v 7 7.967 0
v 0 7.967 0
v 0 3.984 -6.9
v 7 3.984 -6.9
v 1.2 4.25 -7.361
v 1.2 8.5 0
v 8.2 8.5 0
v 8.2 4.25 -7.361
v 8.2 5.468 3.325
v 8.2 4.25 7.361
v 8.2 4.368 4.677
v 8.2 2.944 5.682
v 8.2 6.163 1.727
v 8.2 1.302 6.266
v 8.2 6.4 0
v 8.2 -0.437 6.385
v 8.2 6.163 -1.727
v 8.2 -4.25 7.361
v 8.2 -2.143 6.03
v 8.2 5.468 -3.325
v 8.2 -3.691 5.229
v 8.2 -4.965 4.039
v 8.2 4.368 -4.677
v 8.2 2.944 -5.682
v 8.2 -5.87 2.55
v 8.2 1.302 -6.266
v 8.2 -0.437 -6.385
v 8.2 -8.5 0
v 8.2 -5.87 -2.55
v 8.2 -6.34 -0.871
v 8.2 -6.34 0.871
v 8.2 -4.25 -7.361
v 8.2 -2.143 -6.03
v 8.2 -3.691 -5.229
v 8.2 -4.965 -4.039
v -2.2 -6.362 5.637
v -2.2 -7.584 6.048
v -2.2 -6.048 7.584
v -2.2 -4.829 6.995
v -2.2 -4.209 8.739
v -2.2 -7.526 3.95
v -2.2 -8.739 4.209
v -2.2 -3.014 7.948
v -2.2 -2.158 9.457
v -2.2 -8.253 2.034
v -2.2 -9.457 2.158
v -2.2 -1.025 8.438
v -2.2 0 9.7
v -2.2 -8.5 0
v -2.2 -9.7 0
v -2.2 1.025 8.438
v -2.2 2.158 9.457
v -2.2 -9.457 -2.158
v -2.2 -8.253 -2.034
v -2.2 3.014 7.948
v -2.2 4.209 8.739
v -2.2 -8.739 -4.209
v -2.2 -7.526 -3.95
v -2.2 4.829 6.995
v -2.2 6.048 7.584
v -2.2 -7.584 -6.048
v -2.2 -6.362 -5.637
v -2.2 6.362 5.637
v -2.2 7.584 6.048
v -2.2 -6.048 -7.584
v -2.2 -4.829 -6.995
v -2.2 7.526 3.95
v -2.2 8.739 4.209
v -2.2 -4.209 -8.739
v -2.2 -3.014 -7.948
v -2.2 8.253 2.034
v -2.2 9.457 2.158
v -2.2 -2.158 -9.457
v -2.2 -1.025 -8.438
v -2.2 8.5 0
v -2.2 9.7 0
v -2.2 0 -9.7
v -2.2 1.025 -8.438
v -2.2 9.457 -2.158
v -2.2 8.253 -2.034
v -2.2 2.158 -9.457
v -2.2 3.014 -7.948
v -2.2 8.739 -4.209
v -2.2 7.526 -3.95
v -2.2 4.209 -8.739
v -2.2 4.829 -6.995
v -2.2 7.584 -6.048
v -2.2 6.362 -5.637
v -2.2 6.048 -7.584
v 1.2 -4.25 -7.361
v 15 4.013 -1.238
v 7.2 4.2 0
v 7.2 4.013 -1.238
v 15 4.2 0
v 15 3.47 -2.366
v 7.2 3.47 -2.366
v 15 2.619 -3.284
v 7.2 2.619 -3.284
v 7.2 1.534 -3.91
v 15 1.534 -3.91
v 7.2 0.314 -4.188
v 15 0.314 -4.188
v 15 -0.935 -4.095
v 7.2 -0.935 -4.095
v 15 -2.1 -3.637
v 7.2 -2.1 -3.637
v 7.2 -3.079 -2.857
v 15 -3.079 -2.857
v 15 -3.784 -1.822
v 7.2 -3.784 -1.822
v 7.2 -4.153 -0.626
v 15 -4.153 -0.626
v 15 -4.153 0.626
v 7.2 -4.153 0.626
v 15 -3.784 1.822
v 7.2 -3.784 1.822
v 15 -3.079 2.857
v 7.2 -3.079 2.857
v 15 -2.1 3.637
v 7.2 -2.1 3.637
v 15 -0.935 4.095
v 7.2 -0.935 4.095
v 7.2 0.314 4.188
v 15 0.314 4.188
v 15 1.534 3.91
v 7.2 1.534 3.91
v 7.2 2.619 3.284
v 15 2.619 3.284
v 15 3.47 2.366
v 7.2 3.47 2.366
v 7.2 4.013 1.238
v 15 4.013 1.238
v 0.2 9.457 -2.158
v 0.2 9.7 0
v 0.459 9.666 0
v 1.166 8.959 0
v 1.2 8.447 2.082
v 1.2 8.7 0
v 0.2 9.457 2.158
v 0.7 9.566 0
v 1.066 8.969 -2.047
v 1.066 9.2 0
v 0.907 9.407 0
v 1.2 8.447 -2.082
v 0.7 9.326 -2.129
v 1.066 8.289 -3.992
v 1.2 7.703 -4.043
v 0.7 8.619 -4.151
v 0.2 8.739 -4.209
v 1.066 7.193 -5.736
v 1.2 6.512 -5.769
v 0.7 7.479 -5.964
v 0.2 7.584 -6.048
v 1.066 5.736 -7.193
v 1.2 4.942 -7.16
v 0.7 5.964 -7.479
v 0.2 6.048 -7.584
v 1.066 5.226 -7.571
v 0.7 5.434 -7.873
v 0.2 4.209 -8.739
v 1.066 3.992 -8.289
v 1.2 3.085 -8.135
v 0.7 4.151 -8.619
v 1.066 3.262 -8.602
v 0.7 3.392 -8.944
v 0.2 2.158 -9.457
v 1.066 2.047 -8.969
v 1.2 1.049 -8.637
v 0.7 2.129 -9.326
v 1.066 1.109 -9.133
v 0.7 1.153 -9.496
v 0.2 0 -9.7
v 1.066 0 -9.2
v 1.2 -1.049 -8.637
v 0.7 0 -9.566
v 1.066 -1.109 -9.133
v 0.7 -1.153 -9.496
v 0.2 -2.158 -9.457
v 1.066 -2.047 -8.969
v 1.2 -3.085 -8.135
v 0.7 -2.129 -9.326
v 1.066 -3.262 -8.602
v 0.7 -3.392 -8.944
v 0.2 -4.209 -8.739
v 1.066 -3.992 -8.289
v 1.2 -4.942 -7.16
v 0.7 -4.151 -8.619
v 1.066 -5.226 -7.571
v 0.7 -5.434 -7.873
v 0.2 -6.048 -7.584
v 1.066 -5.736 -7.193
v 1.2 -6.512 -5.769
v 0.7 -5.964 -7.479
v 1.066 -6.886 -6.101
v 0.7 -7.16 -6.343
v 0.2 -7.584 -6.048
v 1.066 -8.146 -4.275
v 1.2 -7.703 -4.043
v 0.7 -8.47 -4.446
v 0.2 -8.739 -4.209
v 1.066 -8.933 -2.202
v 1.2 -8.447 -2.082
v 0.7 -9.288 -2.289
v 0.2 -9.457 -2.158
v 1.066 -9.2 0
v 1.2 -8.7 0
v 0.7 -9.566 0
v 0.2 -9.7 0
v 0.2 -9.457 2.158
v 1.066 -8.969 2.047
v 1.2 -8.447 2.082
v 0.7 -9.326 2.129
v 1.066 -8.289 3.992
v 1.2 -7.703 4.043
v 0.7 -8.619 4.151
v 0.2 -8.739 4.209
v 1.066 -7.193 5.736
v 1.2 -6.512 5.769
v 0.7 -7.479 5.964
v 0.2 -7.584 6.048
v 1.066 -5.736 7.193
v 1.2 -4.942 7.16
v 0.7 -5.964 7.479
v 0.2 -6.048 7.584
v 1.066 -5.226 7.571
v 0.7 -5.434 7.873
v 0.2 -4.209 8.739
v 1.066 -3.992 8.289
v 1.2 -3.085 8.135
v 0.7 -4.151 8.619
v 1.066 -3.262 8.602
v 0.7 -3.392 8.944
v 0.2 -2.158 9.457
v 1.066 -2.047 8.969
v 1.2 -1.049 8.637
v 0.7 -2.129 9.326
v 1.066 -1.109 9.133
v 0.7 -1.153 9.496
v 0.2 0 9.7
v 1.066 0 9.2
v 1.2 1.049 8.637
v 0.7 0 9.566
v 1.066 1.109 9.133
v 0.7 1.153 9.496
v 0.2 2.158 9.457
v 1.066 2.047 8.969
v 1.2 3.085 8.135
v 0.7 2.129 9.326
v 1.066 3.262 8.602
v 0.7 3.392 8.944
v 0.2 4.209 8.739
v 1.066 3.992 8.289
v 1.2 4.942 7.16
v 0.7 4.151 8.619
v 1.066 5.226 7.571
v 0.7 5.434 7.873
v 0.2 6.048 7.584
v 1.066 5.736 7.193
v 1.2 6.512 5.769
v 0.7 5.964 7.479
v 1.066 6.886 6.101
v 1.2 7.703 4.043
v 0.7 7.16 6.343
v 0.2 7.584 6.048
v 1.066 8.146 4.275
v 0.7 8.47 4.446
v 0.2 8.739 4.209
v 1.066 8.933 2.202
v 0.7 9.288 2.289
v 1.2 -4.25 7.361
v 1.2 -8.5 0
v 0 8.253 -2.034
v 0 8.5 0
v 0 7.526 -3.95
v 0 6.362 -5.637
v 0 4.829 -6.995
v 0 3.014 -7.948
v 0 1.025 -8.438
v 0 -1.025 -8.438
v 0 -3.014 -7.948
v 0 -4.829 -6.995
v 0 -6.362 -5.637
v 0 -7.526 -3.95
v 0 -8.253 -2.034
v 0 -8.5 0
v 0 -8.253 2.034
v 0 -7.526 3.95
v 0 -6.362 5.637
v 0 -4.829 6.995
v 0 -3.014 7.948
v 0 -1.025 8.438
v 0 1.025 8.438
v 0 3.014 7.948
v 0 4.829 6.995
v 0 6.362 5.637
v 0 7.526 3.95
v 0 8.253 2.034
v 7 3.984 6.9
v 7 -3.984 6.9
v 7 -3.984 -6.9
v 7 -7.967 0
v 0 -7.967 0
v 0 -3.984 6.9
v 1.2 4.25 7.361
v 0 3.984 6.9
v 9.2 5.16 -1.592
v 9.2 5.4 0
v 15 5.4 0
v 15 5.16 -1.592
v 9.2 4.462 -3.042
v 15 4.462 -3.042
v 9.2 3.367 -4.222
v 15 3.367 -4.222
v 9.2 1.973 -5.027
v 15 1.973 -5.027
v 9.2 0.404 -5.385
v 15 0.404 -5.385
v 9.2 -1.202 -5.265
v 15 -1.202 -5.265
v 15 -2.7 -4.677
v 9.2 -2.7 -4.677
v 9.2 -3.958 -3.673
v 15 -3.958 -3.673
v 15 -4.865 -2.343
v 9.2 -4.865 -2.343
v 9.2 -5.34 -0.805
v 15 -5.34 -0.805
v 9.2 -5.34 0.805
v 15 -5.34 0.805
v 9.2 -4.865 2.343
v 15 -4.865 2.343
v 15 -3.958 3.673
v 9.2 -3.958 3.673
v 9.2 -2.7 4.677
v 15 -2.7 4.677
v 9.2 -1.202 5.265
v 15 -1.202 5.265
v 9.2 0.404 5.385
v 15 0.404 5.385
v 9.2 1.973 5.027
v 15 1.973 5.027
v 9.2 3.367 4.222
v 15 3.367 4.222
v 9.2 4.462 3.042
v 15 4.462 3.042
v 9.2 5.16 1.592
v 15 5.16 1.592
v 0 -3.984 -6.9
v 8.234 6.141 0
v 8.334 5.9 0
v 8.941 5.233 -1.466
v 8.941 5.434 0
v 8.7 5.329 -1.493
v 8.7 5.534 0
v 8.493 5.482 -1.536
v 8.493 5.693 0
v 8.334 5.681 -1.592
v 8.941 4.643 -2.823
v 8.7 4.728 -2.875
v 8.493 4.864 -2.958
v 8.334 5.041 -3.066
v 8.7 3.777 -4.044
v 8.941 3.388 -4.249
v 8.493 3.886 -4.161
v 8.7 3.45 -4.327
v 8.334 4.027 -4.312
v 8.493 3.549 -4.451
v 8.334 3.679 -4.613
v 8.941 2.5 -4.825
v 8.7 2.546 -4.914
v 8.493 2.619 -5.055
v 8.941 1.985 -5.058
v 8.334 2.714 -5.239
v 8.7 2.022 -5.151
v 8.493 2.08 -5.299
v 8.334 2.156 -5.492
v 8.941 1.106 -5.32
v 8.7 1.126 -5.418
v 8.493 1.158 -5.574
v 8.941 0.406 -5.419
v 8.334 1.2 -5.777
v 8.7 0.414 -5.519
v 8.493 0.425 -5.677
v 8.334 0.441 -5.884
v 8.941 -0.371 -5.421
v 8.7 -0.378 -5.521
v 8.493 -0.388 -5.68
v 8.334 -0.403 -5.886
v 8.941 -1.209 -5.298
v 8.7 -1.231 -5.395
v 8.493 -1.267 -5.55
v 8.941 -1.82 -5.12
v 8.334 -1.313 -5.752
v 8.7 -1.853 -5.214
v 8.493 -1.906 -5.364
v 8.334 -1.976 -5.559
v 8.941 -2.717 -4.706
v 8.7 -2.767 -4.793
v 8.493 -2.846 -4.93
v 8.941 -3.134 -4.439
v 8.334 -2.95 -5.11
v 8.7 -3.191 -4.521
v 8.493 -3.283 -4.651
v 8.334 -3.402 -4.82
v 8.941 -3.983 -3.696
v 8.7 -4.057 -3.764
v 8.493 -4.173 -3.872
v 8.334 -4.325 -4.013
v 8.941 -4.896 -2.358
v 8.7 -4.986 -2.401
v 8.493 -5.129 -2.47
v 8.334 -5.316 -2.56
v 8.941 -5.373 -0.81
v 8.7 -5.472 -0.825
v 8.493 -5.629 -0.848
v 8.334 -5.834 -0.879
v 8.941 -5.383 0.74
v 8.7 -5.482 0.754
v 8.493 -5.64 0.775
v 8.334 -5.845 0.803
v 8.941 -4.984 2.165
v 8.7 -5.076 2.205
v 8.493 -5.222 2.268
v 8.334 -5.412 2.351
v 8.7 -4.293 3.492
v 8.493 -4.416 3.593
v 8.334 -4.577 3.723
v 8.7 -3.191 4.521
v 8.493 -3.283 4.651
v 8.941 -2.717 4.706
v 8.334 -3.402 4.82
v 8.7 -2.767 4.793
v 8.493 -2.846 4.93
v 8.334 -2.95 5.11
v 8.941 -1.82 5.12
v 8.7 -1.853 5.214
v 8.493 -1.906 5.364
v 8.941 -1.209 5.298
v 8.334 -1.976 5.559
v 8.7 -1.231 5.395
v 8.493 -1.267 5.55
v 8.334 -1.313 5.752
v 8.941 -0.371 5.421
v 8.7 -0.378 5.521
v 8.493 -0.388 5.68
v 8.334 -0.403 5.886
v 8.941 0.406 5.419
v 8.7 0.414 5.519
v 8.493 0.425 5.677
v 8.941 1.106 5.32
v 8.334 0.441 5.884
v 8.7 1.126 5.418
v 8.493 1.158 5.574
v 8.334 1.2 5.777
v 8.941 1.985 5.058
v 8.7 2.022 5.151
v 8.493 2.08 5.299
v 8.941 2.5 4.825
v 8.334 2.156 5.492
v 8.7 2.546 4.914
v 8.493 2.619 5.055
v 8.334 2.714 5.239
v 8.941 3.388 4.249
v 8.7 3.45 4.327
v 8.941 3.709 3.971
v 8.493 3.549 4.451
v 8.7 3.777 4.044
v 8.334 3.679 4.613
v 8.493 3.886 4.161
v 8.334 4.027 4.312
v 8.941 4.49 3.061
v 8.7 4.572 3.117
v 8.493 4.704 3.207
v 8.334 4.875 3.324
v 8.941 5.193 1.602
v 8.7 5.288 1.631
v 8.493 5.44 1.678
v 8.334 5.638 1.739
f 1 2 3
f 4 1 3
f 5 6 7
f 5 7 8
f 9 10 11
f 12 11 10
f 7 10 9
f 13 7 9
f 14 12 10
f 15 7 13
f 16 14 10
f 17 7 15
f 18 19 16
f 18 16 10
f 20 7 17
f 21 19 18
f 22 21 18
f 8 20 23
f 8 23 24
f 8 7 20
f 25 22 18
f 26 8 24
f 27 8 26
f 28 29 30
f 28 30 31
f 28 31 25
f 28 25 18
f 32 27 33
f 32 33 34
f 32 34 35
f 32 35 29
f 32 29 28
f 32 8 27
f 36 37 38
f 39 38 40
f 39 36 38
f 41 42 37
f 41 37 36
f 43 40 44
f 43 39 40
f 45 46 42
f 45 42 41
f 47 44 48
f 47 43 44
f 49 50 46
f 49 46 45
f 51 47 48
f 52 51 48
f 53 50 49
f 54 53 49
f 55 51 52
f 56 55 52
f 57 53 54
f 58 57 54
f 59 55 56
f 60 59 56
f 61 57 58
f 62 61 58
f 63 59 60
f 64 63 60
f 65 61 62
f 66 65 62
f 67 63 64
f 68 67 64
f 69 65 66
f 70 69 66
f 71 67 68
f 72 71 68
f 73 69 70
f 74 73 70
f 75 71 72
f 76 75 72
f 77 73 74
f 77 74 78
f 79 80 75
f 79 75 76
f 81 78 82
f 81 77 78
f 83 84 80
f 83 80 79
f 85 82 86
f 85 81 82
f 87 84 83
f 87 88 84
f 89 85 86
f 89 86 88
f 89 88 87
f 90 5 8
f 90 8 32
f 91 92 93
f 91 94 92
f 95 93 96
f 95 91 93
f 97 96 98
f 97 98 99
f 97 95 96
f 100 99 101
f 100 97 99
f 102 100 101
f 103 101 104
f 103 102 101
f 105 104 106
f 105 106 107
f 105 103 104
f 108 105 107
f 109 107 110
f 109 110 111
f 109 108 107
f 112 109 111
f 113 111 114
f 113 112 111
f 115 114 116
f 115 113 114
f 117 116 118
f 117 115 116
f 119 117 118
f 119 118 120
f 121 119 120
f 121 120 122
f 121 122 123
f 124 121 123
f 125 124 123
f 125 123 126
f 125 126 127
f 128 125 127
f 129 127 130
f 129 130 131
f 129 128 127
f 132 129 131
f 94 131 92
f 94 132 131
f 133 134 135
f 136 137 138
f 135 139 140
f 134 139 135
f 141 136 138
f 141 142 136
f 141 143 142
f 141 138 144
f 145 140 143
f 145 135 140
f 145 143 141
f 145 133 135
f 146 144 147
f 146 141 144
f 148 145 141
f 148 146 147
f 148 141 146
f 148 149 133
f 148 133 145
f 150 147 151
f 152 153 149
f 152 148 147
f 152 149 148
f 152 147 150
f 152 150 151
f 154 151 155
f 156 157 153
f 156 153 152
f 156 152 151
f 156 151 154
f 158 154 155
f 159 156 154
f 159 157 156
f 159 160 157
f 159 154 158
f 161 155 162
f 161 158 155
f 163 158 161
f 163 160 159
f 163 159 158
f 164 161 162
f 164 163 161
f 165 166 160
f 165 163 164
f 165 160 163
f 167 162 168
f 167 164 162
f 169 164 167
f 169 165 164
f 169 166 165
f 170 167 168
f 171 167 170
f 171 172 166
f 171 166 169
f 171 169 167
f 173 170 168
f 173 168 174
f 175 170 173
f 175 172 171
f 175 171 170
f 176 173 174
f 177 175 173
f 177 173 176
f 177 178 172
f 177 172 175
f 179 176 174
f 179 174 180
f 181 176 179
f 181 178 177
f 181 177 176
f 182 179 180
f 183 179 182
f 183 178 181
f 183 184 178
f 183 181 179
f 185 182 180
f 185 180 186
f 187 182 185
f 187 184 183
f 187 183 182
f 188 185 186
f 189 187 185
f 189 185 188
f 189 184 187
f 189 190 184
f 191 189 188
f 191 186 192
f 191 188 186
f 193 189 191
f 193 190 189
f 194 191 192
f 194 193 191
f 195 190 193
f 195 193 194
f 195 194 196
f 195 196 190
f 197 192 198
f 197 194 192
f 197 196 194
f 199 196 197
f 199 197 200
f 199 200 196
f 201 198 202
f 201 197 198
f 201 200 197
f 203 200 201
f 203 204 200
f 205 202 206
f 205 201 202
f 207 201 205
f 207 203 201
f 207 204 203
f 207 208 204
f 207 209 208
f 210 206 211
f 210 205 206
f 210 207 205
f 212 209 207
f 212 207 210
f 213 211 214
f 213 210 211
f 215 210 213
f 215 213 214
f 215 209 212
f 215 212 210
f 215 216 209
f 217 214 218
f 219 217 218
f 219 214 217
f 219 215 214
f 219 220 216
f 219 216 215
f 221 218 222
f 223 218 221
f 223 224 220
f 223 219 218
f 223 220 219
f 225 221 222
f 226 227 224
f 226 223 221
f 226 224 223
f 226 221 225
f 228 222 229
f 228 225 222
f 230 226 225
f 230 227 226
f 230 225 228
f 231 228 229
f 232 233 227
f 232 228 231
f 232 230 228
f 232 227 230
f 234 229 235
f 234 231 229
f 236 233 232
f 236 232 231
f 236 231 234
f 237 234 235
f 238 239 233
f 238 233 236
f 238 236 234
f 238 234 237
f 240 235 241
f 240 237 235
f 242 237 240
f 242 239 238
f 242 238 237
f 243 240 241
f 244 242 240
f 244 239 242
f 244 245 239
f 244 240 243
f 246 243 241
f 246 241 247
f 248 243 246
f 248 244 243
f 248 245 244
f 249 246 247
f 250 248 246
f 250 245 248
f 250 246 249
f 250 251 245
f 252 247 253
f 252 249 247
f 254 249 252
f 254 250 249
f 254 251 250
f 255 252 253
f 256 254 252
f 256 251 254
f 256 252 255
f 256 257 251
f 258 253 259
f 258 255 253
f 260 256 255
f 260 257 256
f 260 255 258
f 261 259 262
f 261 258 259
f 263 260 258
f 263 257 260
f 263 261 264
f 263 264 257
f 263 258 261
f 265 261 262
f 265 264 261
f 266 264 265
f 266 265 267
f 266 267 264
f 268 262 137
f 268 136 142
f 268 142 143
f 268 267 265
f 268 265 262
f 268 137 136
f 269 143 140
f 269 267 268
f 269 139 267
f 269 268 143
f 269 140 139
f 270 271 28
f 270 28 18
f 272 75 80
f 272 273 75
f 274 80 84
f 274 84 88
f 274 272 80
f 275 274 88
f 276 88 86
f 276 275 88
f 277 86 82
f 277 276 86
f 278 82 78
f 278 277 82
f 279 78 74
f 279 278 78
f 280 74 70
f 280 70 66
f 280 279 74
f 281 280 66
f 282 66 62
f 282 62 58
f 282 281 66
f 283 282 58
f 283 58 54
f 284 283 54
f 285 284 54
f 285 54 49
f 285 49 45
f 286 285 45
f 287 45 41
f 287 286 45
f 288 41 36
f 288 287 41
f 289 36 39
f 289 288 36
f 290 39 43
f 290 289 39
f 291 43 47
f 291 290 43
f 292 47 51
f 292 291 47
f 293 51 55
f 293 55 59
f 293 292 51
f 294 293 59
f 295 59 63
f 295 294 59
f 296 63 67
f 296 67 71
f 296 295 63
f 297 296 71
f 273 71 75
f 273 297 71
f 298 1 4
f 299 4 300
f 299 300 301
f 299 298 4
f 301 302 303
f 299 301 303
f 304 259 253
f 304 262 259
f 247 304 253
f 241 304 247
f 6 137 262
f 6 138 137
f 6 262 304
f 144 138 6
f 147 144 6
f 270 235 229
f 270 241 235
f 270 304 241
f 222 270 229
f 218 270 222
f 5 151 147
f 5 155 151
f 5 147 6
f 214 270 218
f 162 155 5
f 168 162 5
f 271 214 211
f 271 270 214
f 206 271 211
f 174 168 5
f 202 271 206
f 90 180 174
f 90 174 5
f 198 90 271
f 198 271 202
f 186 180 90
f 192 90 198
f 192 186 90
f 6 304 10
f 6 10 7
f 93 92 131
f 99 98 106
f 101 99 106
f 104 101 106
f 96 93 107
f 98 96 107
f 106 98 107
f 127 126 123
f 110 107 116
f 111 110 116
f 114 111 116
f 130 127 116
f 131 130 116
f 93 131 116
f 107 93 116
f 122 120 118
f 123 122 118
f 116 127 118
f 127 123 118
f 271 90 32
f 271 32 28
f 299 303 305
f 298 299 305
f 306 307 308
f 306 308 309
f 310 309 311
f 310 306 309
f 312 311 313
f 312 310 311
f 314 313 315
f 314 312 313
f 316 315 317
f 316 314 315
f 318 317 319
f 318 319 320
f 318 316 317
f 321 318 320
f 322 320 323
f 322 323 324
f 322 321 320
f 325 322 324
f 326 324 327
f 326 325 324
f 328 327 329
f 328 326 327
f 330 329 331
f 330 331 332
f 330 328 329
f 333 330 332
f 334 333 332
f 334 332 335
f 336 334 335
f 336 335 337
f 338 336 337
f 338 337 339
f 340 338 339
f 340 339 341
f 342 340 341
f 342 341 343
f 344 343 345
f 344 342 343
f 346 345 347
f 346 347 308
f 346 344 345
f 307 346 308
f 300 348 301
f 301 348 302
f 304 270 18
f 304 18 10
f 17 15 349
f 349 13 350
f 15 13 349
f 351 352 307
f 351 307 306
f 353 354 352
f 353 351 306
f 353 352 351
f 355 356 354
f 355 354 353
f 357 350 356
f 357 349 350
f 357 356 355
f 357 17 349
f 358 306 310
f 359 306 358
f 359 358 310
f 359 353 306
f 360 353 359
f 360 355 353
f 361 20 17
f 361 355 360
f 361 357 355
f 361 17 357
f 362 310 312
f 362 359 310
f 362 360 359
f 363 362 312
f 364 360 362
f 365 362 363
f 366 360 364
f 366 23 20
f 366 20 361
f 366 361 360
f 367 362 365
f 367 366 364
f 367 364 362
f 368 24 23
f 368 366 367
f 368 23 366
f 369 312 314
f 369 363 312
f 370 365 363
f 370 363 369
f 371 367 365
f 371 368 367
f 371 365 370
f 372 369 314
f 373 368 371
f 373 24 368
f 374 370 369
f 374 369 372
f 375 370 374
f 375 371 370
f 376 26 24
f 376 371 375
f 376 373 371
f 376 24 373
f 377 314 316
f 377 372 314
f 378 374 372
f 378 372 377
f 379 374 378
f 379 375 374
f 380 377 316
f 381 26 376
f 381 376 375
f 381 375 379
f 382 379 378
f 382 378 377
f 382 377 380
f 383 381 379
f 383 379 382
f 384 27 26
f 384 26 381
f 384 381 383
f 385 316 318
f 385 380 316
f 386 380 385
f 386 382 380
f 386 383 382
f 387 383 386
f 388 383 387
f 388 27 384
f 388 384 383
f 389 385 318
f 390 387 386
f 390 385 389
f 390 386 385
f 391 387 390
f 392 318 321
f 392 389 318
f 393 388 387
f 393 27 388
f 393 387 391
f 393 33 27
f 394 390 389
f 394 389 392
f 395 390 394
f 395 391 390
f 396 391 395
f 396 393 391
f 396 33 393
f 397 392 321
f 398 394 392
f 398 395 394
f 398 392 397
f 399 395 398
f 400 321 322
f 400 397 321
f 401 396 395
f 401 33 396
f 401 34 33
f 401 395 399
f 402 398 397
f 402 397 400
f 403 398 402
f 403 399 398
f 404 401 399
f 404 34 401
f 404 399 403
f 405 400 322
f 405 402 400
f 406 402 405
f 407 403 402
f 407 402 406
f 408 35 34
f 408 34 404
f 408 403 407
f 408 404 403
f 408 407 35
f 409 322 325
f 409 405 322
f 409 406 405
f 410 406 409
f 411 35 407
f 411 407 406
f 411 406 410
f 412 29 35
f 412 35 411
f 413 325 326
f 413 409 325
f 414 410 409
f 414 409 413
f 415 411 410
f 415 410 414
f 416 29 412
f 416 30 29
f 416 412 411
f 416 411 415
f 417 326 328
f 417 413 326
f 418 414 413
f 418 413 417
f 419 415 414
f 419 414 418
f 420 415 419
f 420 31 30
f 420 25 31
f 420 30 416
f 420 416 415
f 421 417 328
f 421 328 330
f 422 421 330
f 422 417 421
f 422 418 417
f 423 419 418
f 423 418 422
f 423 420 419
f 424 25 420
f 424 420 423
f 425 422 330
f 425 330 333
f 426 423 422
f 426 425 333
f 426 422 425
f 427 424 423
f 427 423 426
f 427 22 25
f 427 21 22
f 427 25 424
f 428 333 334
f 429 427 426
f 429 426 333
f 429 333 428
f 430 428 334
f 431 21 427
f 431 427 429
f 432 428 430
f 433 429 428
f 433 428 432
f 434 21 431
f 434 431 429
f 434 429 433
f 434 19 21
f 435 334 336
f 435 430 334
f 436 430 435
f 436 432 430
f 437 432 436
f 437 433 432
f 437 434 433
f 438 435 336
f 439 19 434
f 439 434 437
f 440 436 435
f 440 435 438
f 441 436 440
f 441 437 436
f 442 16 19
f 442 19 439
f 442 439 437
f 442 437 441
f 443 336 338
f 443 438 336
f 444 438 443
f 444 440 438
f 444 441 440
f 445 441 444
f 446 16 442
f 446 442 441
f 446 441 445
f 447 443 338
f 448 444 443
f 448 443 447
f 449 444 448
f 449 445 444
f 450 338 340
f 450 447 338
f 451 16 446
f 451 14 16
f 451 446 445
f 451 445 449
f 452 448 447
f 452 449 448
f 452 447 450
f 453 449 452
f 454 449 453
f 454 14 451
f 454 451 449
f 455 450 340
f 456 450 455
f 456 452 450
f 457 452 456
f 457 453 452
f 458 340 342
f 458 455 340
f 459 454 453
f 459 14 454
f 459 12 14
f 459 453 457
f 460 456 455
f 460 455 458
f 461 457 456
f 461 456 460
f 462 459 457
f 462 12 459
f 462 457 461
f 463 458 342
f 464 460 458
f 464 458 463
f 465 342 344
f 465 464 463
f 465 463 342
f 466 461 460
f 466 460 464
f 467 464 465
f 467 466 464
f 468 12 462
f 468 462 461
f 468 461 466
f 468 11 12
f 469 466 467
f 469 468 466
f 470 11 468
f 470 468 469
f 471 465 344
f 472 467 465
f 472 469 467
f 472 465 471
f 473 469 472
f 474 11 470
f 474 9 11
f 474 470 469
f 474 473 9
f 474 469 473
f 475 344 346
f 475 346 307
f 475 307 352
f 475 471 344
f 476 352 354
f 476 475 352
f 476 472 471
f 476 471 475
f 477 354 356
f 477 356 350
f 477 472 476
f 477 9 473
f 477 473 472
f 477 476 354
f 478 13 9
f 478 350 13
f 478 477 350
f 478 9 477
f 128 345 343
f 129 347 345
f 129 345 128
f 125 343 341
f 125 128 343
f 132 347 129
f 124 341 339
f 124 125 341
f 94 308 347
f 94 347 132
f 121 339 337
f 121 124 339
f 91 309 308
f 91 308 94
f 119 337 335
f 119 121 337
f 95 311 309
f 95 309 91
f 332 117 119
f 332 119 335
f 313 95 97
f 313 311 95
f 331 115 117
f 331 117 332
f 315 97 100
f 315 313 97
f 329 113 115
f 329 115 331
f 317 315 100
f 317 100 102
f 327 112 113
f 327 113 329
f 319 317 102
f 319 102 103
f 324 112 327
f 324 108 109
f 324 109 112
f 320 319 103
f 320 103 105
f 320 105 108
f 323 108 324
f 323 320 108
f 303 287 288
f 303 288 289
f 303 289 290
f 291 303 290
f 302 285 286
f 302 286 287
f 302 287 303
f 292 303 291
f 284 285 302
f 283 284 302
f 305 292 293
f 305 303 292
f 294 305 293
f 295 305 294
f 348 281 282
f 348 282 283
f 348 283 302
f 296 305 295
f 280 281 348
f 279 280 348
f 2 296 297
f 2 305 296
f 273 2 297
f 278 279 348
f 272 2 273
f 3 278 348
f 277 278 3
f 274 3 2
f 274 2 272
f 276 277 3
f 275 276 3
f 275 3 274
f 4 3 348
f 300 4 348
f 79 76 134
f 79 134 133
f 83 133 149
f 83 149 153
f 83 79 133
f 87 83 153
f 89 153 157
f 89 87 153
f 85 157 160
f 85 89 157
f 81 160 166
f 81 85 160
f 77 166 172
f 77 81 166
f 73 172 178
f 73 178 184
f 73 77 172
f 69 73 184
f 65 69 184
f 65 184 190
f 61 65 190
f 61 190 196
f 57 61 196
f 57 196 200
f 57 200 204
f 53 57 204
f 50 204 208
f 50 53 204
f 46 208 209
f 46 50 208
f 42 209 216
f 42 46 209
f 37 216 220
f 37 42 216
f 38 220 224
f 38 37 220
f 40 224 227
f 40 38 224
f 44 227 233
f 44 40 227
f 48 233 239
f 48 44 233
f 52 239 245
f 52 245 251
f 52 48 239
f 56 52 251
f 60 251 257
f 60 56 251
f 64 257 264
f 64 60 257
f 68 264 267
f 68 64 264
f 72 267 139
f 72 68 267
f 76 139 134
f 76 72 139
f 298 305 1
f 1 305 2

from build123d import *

# Parameters (mm, degrees)
F3_DEPTH = 7
F4_R     = 10.135693
F5_DEPTH = 13.801
F6_R     = 1
F7_R     = 1
F8_R     = 4.2
F9_DEPTH = 0.2


with BuildPart() as f1:
    # F0 (on Top) → F1 (revolve)
    with BuildSketch(Plane.XY):
        Polygon((0, 8.5), (0, 6.7), (7, 6.7), (7, 4.2), (15, 4.2), (15, 5.4), (8.2, 5.4), (8.2, 8.5), (1.2, 8.5), (1.2, 9.7), (-2.2, 9.7), (-2.2, 8.5), align=None)
    revolve(axis=Axis((9.6, 0, 0), (-1, 0, 0)))

    # F2 (on face) → F3 (cut)
    with BuildSketch(Plane(origin=(0, 0, 0), x_dir=(0, -1, 0), z_dir=(-1, 0, 0))):
        Polygon((3.983717, 6.9), (-3.983717, 6.9), (-7.967434, 0), (-3.983717, -6.9), (3.983717, -6.9), (7.967434, 0), align=None)
    extrude(amount=-F3_DEPTH, mode=Mode.SUBTRACT)

    # F4 (on face) → F5 (cut, through all)
    with BuildSketch(Plane.YZ.offset(1.2)):
        Circle(F4_R)
        Polygon((-8.5, 0), (-4.25, 7.361216), (4.25, 7.361216), (8.5, 0), (4.25, -7.361216), (-4.25, -7.361216), align=None, mode=Mode.SUBTRACT)
    extrude(amount=F5_DEPTH, mode=Mode.SUBTRACT)

    # F6
    f6_edges = [f1.edges().sort_by_distance(p)[0] for p in [
        (8.2, -5.4, 0),
    ]]
    fillet(f6_edges, radius=F6_R)

    # F7
    f7_edges = [f1.edges().sort_by_distance(p)[0] for p in [
        (1.2, -9.7, 0),
    ]]
    fillet(f7_edges, radius=F7_R)

    # F8 (on face) → F9 (join)
    with BuildSketch(Plane(origin=(7, 0, 0), x_dir=(0, -1, 0), z_dir=(-1, 0, 0))):
        Circle(F8_R)
    extrude(amount=-F9_DEPTH)


solid = f1.part
